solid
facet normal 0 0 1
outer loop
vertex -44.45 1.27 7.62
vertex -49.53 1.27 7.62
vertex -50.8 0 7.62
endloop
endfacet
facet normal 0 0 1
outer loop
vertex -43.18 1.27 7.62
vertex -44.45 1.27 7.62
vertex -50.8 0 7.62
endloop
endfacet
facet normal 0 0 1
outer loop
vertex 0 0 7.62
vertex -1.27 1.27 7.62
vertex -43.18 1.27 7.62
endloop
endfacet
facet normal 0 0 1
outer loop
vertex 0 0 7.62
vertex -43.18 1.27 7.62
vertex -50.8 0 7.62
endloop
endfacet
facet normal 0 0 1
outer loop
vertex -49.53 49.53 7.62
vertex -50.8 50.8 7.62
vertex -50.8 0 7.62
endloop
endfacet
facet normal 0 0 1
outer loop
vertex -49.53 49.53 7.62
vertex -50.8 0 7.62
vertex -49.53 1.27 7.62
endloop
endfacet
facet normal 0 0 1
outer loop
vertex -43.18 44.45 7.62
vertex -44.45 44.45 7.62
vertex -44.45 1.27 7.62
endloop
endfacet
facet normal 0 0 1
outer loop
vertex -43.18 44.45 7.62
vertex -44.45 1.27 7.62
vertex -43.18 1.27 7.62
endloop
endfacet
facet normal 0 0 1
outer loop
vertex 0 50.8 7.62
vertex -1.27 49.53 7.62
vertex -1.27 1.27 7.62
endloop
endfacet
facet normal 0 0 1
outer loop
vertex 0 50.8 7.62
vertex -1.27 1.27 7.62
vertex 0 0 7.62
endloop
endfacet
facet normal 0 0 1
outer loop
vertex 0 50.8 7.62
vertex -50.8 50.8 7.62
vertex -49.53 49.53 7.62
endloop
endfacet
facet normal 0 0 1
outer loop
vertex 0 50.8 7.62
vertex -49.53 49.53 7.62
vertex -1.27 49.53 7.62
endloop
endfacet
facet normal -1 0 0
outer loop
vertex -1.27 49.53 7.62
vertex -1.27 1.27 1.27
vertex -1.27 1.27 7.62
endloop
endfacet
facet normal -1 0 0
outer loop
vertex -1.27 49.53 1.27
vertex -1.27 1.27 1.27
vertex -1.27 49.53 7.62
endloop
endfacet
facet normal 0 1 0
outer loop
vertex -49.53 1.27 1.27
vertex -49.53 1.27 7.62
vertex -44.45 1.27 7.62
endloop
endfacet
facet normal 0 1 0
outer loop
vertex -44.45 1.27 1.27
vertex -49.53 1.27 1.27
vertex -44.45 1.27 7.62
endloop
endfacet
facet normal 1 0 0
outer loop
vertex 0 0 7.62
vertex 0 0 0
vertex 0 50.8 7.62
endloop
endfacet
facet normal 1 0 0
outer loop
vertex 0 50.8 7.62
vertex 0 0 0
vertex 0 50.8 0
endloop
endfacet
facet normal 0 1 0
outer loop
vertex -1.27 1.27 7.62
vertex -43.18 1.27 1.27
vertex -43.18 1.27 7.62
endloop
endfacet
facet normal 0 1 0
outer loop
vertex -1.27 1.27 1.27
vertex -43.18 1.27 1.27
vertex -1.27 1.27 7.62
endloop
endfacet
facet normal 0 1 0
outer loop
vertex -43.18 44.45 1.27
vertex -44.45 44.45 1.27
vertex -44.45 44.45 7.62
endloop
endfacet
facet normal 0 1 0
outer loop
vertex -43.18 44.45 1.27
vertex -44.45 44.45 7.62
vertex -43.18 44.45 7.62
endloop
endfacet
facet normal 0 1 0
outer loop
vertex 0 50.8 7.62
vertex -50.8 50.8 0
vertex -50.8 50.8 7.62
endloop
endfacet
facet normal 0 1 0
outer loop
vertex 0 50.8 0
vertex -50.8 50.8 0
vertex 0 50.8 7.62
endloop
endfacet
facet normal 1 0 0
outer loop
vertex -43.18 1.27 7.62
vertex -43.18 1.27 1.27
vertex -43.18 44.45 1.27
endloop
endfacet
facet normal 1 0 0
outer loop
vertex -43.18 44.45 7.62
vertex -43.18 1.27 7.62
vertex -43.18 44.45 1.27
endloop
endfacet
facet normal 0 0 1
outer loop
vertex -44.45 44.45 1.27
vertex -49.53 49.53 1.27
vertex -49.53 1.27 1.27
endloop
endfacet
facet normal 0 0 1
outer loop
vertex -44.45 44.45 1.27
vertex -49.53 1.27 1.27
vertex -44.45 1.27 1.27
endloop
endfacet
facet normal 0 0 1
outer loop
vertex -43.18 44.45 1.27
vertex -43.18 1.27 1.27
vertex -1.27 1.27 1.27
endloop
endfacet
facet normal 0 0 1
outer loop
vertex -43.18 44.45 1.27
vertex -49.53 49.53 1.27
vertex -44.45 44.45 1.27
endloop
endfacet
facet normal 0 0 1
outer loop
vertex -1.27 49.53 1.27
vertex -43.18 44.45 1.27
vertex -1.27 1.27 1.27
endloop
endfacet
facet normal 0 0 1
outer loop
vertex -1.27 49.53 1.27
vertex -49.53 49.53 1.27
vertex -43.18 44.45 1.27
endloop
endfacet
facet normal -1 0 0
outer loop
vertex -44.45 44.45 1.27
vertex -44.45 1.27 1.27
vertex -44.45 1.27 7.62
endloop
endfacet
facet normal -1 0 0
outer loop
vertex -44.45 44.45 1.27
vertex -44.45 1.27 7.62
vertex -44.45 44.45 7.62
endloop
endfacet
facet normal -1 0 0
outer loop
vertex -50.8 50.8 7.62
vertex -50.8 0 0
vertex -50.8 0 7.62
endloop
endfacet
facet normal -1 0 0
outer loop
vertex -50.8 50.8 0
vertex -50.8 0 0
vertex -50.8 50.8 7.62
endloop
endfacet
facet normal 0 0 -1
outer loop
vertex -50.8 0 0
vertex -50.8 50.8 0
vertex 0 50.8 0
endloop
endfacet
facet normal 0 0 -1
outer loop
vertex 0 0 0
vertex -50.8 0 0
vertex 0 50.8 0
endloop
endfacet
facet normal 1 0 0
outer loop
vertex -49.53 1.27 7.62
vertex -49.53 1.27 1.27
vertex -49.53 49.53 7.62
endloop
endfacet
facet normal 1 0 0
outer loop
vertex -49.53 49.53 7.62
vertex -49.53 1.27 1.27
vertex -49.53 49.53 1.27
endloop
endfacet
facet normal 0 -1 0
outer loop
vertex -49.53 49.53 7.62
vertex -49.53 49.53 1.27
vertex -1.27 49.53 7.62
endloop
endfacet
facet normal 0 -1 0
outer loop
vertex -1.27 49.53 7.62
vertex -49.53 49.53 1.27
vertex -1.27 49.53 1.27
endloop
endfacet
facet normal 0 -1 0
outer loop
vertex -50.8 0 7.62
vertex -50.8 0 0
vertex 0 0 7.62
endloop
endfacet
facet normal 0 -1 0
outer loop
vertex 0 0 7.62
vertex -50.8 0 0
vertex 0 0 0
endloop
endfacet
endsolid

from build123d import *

# Parameters (mm, degrees)
F0_W     = 50.8
F0_H     = 50.8
F1_DEPTH = 7.62
F2_T     = -1.27
F3_W     = 1.27
F3_H     = 43.18
F4_DEPTH = 6.35


with BuildPart() as f1:
    # F0 (on Top) → F1 (new body)
    with BuildSketch(Plane.XY):
        with Locations((-25.4, 25.4)):
            Rectangle(F0_W, F0_H)
    extrude(amount=F1_DEPTH)

    # F2
    f2_openings = [f1.faces().sort_by_distance(p)[0] for p in [
        (-25.4, 25.4, 7.62),
    ]]
    offset(amount=F2_T, openings=f2_openings)

    # F3 (on face) → F4 (join)
    with BuildSketch(Plane.XY.offset(1.27)):
        with Locations((-43.815, 22.86)):
            Rectangle(F3_W, F3_H)
    extrude(amount=F4_DEPTH)


solid = f1.part
